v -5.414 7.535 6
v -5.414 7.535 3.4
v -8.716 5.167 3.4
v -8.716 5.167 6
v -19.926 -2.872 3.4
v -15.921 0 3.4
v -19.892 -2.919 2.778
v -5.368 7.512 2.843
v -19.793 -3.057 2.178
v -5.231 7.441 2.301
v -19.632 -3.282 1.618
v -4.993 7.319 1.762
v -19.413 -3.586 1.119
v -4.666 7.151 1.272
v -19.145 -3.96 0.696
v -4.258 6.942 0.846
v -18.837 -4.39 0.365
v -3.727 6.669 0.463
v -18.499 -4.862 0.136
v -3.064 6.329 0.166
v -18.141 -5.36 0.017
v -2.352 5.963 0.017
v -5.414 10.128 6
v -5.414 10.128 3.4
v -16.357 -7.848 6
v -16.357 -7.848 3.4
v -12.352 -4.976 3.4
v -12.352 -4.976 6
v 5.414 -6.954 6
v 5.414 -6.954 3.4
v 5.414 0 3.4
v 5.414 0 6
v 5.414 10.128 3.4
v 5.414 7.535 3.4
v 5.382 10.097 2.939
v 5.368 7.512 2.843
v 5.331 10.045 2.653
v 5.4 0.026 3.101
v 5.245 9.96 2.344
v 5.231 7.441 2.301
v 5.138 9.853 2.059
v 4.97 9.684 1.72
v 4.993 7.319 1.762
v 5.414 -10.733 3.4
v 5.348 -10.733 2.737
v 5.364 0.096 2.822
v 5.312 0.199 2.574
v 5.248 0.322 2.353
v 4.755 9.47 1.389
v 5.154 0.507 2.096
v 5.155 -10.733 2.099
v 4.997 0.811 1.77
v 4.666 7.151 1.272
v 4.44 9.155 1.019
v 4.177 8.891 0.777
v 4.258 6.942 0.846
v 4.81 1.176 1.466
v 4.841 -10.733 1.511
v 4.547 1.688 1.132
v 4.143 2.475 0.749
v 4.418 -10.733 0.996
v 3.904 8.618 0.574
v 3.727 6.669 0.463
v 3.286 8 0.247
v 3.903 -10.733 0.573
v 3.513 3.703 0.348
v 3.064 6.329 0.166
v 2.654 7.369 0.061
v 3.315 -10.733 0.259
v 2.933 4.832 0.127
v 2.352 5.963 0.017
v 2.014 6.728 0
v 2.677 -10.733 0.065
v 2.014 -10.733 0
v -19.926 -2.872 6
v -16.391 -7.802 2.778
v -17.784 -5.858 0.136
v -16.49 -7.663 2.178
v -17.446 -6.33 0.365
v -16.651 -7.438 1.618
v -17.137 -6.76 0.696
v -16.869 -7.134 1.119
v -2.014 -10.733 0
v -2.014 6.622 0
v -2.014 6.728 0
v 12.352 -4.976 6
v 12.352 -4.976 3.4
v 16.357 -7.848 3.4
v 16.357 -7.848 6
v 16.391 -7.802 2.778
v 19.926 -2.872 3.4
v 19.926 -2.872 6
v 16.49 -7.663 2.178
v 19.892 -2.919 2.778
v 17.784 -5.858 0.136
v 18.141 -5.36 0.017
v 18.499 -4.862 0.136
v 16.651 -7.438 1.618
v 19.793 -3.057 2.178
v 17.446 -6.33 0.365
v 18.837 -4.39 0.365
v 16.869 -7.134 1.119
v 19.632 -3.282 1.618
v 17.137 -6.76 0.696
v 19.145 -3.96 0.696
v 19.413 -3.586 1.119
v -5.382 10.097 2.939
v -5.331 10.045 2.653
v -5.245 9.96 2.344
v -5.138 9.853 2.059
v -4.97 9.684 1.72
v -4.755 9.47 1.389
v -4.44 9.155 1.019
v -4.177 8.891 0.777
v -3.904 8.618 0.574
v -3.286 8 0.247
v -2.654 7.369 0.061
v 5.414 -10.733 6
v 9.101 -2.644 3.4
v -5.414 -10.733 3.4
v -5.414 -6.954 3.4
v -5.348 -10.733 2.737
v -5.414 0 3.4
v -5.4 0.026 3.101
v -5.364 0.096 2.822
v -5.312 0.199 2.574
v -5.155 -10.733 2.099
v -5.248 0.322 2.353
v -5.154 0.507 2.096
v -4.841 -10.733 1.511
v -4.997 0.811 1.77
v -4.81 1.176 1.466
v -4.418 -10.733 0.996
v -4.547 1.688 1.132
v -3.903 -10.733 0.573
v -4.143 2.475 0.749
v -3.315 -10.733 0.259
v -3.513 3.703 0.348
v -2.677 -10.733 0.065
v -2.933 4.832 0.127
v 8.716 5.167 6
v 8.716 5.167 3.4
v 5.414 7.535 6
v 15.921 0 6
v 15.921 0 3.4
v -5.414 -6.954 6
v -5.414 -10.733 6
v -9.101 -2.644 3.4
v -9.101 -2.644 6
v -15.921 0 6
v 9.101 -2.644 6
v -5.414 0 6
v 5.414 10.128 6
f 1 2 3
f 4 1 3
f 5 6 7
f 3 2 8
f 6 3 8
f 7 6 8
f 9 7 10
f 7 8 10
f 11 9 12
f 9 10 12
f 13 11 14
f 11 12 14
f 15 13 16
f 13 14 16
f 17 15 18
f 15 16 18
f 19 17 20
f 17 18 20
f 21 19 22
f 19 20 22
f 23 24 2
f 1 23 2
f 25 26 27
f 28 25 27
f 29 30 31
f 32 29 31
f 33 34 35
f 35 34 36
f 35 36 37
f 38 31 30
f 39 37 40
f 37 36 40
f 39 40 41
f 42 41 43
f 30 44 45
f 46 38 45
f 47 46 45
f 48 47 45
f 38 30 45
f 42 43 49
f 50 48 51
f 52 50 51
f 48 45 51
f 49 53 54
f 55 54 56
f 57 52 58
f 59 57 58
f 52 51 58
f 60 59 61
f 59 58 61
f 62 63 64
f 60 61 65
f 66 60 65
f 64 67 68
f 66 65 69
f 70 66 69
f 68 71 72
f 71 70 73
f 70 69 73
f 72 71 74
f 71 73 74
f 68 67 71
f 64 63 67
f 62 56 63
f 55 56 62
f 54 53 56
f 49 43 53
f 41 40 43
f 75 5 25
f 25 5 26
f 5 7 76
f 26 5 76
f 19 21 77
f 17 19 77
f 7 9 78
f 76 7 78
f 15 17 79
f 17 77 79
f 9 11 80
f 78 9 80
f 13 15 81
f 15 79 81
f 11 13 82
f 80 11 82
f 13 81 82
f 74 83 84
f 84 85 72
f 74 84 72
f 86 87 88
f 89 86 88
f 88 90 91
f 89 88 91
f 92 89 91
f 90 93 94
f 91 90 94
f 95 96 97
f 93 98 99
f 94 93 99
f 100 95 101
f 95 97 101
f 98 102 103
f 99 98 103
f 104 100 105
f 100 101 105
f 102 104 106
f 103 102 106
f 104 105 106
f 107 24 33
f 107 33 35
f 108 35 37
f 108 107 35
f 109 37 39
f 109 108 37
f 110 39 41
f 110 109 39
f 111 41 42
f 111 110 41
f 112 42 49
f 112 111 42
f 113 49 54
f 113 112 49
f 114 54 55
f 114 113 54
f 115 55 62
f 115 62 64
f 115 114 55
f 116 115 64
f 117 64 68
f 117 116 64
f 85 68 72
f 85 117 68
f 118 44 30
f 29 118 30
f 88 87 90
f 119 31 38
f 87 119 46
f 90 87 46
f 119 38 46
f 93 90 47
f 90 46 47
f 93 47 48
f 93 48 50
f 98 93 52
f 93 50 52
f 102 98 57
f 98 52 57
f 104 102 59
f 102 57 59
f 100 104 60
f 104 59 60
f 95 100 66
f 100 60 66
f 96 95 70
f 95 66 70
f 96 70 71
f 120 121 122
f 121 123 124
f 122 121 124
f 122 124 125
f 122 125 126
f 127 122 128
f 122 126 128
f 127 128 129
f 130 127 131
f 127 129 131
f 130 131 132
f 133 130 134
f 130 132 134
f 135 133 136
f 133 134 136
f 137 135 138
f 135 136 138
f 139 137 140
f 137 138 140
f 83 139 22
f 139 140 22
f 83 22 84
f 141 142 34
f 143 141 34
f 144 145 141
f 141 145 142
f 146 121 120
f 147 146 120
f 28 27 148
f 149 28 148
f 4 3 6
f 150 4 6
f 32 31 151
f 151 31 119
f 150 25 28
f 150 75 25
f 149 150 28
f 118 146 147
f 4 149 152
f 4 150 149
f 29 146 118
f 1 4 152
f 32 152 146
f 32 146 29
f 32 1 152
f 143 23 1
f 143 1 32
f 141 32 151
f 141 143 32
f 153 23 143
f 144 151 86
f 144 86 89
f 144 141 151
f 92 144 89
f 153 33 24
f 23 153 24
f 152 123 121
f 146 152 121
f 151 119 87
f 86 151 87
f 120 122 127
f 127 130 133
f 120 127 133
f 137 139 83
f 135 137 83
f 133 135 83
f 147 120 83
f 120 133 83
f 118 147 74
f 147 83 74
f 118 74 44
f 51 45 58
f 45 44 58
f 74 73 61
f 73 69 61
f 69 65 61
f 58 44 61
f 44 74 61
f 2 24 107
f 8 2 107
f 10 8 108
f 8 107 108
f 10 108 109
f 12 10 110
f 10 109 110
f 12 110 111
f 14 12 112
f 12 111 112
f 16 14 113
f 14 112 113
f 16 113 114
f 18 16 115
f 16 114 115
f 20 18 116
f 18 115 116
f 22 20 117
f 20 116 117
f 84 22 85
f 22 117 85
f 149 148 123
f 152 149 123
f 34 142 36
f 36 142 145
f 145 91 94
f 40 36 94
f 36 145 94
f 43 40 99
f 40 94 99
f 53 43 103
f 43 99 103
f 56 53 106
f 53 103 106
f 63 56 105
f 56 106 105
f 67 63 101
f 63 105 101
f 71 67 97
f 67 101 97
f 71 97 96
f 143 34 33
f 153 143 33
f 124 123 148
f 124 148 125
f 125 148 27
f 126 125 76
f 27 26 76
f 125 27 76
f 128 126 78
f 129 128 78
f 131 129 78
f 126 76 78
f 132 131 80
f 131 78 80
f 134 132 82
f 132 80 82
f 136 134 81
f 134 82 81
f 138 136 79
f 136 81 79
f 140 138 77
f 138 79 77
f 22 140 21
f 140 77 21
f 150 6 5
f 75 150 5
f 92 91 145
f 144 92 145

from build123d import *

# Parameters (mm, degrees)
F0_W          = 10.8273038641
F0_H          = 3.767536847
F0_H_2        = 3.7791659124
F0_H_3        = 3.1744926237
F1_DEPTH      = 6
F2_T1_DEPTH   = 27.8273038641
F2_T6_DEPTH   = 34.8580118286
F2_T11_DEPTH  = 30.4667466587
F2_T16_DEPTH  = 27.7328249142
F2_T21_DEPTH  = 27.7328249142
F2_T26_DEPTH  = 27.7328249142
F2_T31_DEPTH  = 27.7328249142
F2_T36_DEPTH  = 30.4667466587
F2_T41_DEPTH  = 34.8580118286
F2_T46_DEPTH  = 19.5930984205
F2_T51_DEPTH  = 19.5930984205
F2_T56_DEPTH  = 19.5930984205
F2_T61_DEPTH  = 19.5930984205
F2_T67_DEPTH  = 34.8580118286
F2_T71_DEPTH  = 19.5930984205
F2_T79_DEPTH  = 27.7328249142
F2_T84_DEPTH  = 30.4667466587
F2_T91_DEPTH  = 30.4667466587
F2_T95_DEPTH  = 27.7328249142
F2_T103_DEPTH = 19.5930984205
F2_T108_DEPTH = 34.8580118286


# Not quite as in the source:
# - a fillet or chamfer that OpenCascade refuses, or shapes differently, is made with other operations: its cross-section is extruded or revolved along the edge and cut away or added


with BuildPart() as f1:
    # F0 (on Top) → F1 (new body)
    with BuildSketch(Plane.XY):
        Polygon((-16.3571660357, -7.848105799), (-12.3521852931, -4.9759467929), (-15.9206694666, 0), (-19.9256502092, -2.8721590061), align=None)
        Polygon((-12.3521852931, -4.9759467929), (-9.1011668972, -2.644489449), (-12.6696510706, 2.331457344), (-15.9206694666, 0), align=None)
        Polygon((-9.1011668972, -2.644489449), (-5.413651932, 0), (-8.7160122578, 5.1667966509), (-12.6696510706, 2.331457344), align=None)
        Polygon((-8.7160122578, 5.1667966509), (-5.413651932, 0), (-5.413651932, 3.767536847), (-5.413651932, 7.535073694), align=None)
        Polygon((-5.413651932, 7.535073694), (-5.413651932, 3.767536847), (5.413651932, 3.767536847), (5.413651932, 7.535073694), (0, 7.535073694), align=None)
        Polygon((-5.413651932, 10.1281721145), (-5.413651932, 7.535073694), (0, 7.535073694), (5.413651932, 7.535073694), (5.413651932, 10.1281721145), (0, 10.1281721145), align=None)
        Polygon((5.413651932, 3.767536847), (5.413651932, 0), (8.7160122578, 5.1667966509), (5.413651932, 7.535073694), align=None)
        Polygon((8.7160122578, 5.1667966509), (5.413651932, 0), (9.1011668972, -2.644489449), (12.6696510706, 2.331457344), align=None)
        Polygon((12.6696510706, 2.331457344), (9.1011668972, -2.644489449), (12.3521852931, -4.9759467929), (15.9206694666, 0), align=None)
        Polygon((15.9206694666, 0), (12.3521852931, -4.9759467929), (16.3571660357, -7.848105799), (19.9256502092, -2.8721590061), align=None)
        with Locations((0, 1.8837684235)):
            Rectangle(F0_W, F0_H)
        with Locations((0, -5.0640755799)):
            Rectangle(F0_W, F0_H_2)
        with Locations((0, -1.5872463118)):
            Rectangle(F0_W, F0_H_3)
        Polygon((5.413651932, -6.9536585361), (-5.413651932, -6.9536585361), (-5.413651932, -10.7328249142), (0, -10.7328249142), (5.413651932, -10.7328249142), align=None)
    extrude(amount=F1_DEPTH)

    # F2: fillet of radius 3.4 on 9 edges, made by hand

    # F2_s2 → F2_t1 (cut)
    with BuildSketch(Plane.YZ.offset(-13.913651932)):
        with BuildLine():
            ThreePointArc((10.1281721145, 3.4), (9.1323351705, 0.995836944), (6.7281721145, 0))
            Line((6.7281721145, 0), (10.1281721145, 0))
            Line((10.1281721145, 0), (10.1281721145, 3.4))
        make_face()
    extrude(amount=F2_T1_DEPTH, mode=Mode.SUBTRACT)


with BuildPart() as f2_tool4:
    # F2_s5 → F2_t6 (new body)
    with BuildSketch(Plane(origin=(21.4259097927, -15.365522016, 0), x_dir=(0, 0, 1), z_dir=(-0.8126323589, 0.5827766719, 0))):
        with BuildLine():
            ThreePointArc((3.4, 9.278194766), (0.995836944, 8.2823578221), (0, 5.878194766))
            Line((0, 5.878194766), (0, 9.278194766))
            Line((0, 9.278194766), (3.4, 9.278194766))
        make_face()
    extrude(amount=F2_T6_DEPTH)

    split(bisect_by=Plane.YZ.offset(5.413651932), keep=Keep.TOP)


with BuildPart() as f1_1:
    add(f1.part)

    # F2_t3: cut F2_tool4
    add(f2_tool4.part, mode=Mode.SUBTRACT)


with BuildPart() as f2_tool9:
    # F2_s10 → F2_t11 (new body)
    with BuildSketch(Plane(origin=(-3.3323544119, 2.3897872052, 0), x_dir=(0, 0, 1), z_dir=(0.8126323589, -0.5827766719, 0))):
        with BuildLine():
            ThreePointArc((3.4, -3.1549500557), (0.995836944, -4.1507869997), (0, -6.5549500557))
            Line((0, -6.5549500557), (0, -3.1549500557))
            Line((0, -3.1549500557), (3.4, -3.1549500557))
        make_face()
    extrude(amount=F2_T11_DEPTH)

    split(bisect_by=Plane.YZ.offset(5.413651932), keep=Keep.TOP)


with BuildPart() as f1_2:
    add(f1_1.part)

    # F2_t8: cut F2_tool9
    add(f2_tool9.part, mode=Mode.SUBTRACT)


with BuildPart() as f2_tool14:
    # F2_s15 → F2_t16 (new body)
    with BuildSketch(Plane.XZ.offset(19.2328249142)):
        with BuildLine():
            ThreePointArc((5.413651932, 3.4), (4.4178149881, 0.995836944), (2.013651932, 0))
            Line((2.013651932, 0), (5.413651932, 0))
            Line((5.413651932, 0), (5.413651932, 3.4))
        make_face()
    extrude(amount=-F2_T16_DEPTH)

    split(bisect_by=Plane(origin=(1.8386312935, 2.5638145059, 0), x_dir=(0, 0, 1), z_dir=(-0.5827766719, -0.8126323589, 0)), keep=Keep.TOP)


with BuildPart() as f1_3:
    add(f1_2.part)

    # F2_t13: cut F2_tool14
    add(f2_tool14.part, mode=Mode.SUBTRACT)


with BuildPart() as f2_tool19:
    # F2_s20 → F2_t21 (new body)
    with BuildSketch(Plane.XZ.offset(19.2328249142)):
        with BuildLine():
            ThreePointArc((5.413651932, 3.4), (4.4178149881, 0.995836944), (2.013651932, 0))
            Line((2.013651932, 0), (5.413651932, 0))
            Line((5.413651932, 0), (5.413651932, 3.4))
        make_face()
    extrude(amount=-F2_T21_DEPTH)

    split(bisect_by=Plane(origin=(5.4071154669, 7.5397612989, 0), x_dir=(0, 0, 1), z_dir=(0.5827766719, 0.8126323589, 0)), keep=Keep.TOP)


with BuildPart() as f1_4:
    add(f1_3.part)

    # F2_t18: cut F2_tool19
    add(f2_tool19.part, mode=Mode.SUBTRACT)


with BuildPart() as f2_tool24:
    # F2_s25 → F2_t26 (new body)
    with BuildSketch(Plane.XZ.offset(-8.5)):
        with BuildLine():
            ThreePointArc((-5.413651932, 3.4), (-4.4178149881, 0.995836944), (-2.013651932, 0))
            Line((-2.013651932, 0), (-5.413651932, 0))
            Line((-5.413651932, 0), (-5.413651932, 3.4))
        make_face()
    extrude(amount=F2_T26_DEPTH)

    split(bisect_by=Plane(origin=(-5.4071154669, 7.5397612989, 0), x_dir=(0, 0, 1), z_dir=(-0.5827766719, 0.8126323589, 0)), keep=Keep.TOP)


with BuildPart() as f1_5:
    add(f1_4.part)

    # F2_t23: cut F2_tool24
    add(f2_tool24.part, mode=Mode.SUBTRACT)


with BuildPart() as f2_tool29:
    # F2_s30 → F2_t31 (new body)
    with BuildSketch(Plane.XZ.offset(-8.5)):
        with BuildLine():
            ThreePointArc((-5.413651932, 3.4), (-4.4178149881, 0.995836944), (-2.013651932, 0))
            Line((-2.013651932, 0), (-5.413651932, 0))
            Line((-5.413651932, 0), (-5.413651932, 3.4))
        make_face()
    extrude(amount=F2_T31_DEPTH)

    split(bisect_by=Plane(origin=(-1.8386312935, 2.5638145059, 0), x_dir=(0, 0, 1), z_dir=(0.5827766719, -0.8126323589, 0)), keep=Keep.TOP)


with BuildPart() as f1_6:
    add(f1_5.part)

    # F2_t28: cut F2_tool29
    add(f2_tool29.part, mode=Mode.SUBTRACT)


with BuildPart() as f2_tool34:
    # F2_s35 → F2_t36 (new body)
    with BuildSketch(Plane(origin=(-21.4259097927, -15.365522016, 0), x_dir=(0, 0, 1), z_dir=(0.8126323589, 0.5827766719, 0))):
        with BuildLine():
            ThreePointArc((3.4, -3.1549500557), (0.995836944, -4.1507869997), (0, -6.5549500557))
            Line((0, -6.5549500557), (0, -3.1549500557))
            Line((0, -3.1549500557), (3.4, -3.1549500557))
        make_face()
    extrude(amount=F2_T36_DEPTH)

    split(bisect_by=Plane.YZ.offset(-5.413651932), keep=Keep.BOTTOM)


with BuildPart() as f1_7:
    add(f1_6.part)

    # F2_t33: cut F2_tool34
    add(f2_tool34.part, mode=Mode.SUBTRACT)


with BuildPart() as f2_tool39:
    # F2_s40 → F2_t41 (new body)
    with BuildSketch(Plane(origin=(6.9008385854, 4.9489141062, 0), x_dir=(0, 0, 1), z_dir=(-0.8126323589, -0.5827766719, 0))):
        with BuildLine():
            ThreePointArc((3.4, 9.278194766), (0.995836944, 8.2823578221), (0, 5.878194766))
            Line((0, 5.878194766), (0, 9.278194766))
            Line((0, 9.278194766), (3.4, 9.278194766))
        make_face()
    extrude(amount=F2_T41_DEPTH)

    split(bisect_by=Plane.YZ.offset(-5.413651932), keep=Keep.BOTTOM)


with BuildPart() as f1_8:
    add(f1_7.part)

    # F2_t38: cut F2_tool39
    add(f2_tool39.part, mode=Mode.SUBTRACT)


with BuildPart() as f2_tool44:
    # F2_s45 → F2_t46 (new body)
    with BuildSketch(Plane.XZ.offset(0.964926306)):
        with BuildLine():
            ThreePointArc((5.413651932, 3.4), (4.4178149881, 0.995836944), (2.013651932, 0))
            Line((2.013651932, 0), (5.413651932, 0))
            Line((5.413651932, 0), (5.413651932, 3.4))
        make_face()
    extrude(amount=-F2_T46_DEPTH)

    split(bisect_by=Plane(origin=(1.8386312935, 2.5638145059, 0), x_dir=(0, 0, 1), z_dir=(-0.5827766719, -0.8126323589, 0)), keep=Keep.TOP)


with BuildPart() as f1_9:
    add(f1_8.part)

    # F2_t43: cut F2_tool44
    add(f2_tool44.part, mode=Mode.SUBTRACT)


with BuildPart() as f2_tool49:
    # F2_s50 → F2_t51 (new body)
    with BuildSketch(Plane.XZ.offset(0.964926306)):
        with BuildLine():
            ThreePointArc((5.413651932, 3.4), (4.4178149881, 0.995836944), (2.013651932, 0))
            Line((2.013651932, 0), (5.413651932, 0))
            Line((5.413651932, 0), (5.413651932, 3.4))
        make_face()
    extrude(amount=-F2_T51_DEPTH)

    split(bisect_by=Plane(origin=(5.4071154669, 7.5397612989, 0), x_dir=(0, 0, 1), z_dir=(0.5827766719, 0.8126323589, 0)), keep=Keep.TOP)


with BuildPart() as f1_10:
    add(f1_9.part)

    # F2_t48: cut F2_tool49
    add(f2_tool49.part, mode=Mode.SUBTRACT)


with BuildPart() as f2_tool54:
    # F2_s55 → F2_t56 (new body)
    with BuildSketch(Plane.XZ.offset(-18.6281721145)):
        with BuildLine():
            ThreePointArc((-5.413651932, 3.4), (-4.4178149881, 0.995836944), (-2.013651932, 0))
            Line((-2.013651932, 0), (-5.413651932, 0))
            Line((-5.413651932, 0), (-5.413651932, 3.4))
        make_face()
    extrude(amount=F2_T56_DEPTH)

    split(bisect_by=Plane(origin=(-5.4071154669, 7.5397612989, 0), x_dir=(0, 0, 1), z_dir=(-0.5827766719, 0.8126323589, 0)), keep=Keep.TOP)


with BuildPart() as f1_11:
    add(f1_10.part)

    # F2_t53: cut F2_tool54
    add(f2_tool54.part, mode=Mode.SUBTRACT)


with BuildPart() as f2_tool59:
    # F2_s60 → F2_t61 (new body)
    with BuildSketch(Plane.XZ.offset(-18.6281721145)):
        with BuildLine():
            ThreePointArc((-5.413651932, 3.4), (-4.4178149881, 0.995836944), (-2.013651932, 0))
            Line((-2.013651932, 0), (-5.413651932, 0))
            Line((-5.413651932, 0), (-5.413651932, 3.4))
        make_face()
    extrude(amount=F2_T61_DEPTH)

    split(bisect_by=Plane(origin=(-1.8386312935, 2.5638145059, 0), x_dir=(0, 0, 1), z_dir=(0.5827766719, -0.8126323589, 0)), keep=Keep.TOP)


with BuildPart() as f1_12:
    add(f1_11.part)

    # F2_t58: cut F2_tool59
    add(f2_tool59.part, mode=Mode.SUBTRACT)


with BuildPart() as f2_tool65:
    # F2_s66 → F2_t67 (new body)
    with BuildSketch(Plane(origin=(21.4259097927, -15.365522016, 0), x_dir=(0, 0, 1), z_dir=(-0.8126323589, 0.5827766719, 0))):
        with BuildLine():
            ThreePointArc((3.4, 9.278194766), (0.995836944, 8.2823578221), (0, 5.878194766))
            Line((0, 5.878194766), (0, 9.278194766))
            Line((0, 9.278194766), (3.4, 9.278194766))
        make_face()
    extrude(amount=F2_T67_DEPTH)

    split(bisect_by=Plane.YZ.offset(5.413651932), keep=Keep.BOTTOM)


with BuildPart() as f2_tool69:
    # F2_s70 → F2_t71 (new body)
    with BuildSketch(Plane.XZ.offset(0.964926306)):
        with BuildLine():
            ThreePointArc((5.413651932, 3.4), (4.4178149881, 0.995836944), (2.013651932, 0))
            Line((2.013651932, 0), (5.413651932, 0))
            Line((5.413651932, 0), (5.413651932, 3.4))
        make_face()
    extrude(amount=-F2_T71_DEPTH)

    split(bisect_by=Plane(origin=(1.8386312935, 2.5638145059, 0), x_dir=(0, 0, 1), z_dir=(0.5827766719, 0.8126323589, 0)), keep=Keep.TOP)

    split(bisect_by=Plane(origin=(5.4071154669, 7.5397612989, 0), x_dir=(0, 0, 1), z_dir=(-0.5827766719, -0.8126323589, 0)), keep=Keep.TOP)


with BuildPart() as f2_tool65_1:
    add(f2_tool65.part)

    # F2_t74: intersect F2_tool69
    add(f2_tool69.part, mode=Mode.INTERSECT)


with BuildPart() as f1_13:
    add(f1_12.part)

    # F2_t63: cut F2_tool65
    add(f2_tool65_1.part, mode=Mode.SUBTRACT)


with BuildPart() as f2_tool77:
    # F2_s78 → F2_t79 (new body)
    with BuildSketch(Plane.XZ.offset(19.2328249142)):
        with BuildLine():
            ThreePointArc((5.413651932, 3.4), (4.4178149881, 0.995836944), (2.013651932, 0))
            Line((2.013651932, 0), (5.413651932, 0))
            Line((5.413651932, 0), (5.413651932, 3.4))
        make_face()
    extrude(amount=-F2_T79_DEPTH)

    split(bisect_by=Plane(origin=(1.8386312935, 2.5638145059, 0), x_dir=(0, 0, 1), z_dir=(0.5827766719, 0.8126323589, 0)), keep=Keep.TOP)

    split(bisect_by=Plane(origin=(5.4071154669, 7.5397612989, 0), x_dir=(0, 0, 1), z_dir=(-0.5827766719, -0.8126323589, 0)), keep=Keep.TOP)


with BuildPart() as f2_tool82:
    # F2_s83 → F2_t84 (new body)
    with BuildSketch(Plane(origin=(-3.3323544119, 2.3897872052, 0), x_dir=(0, 0, 1), z_dir=(0.8126323589, -0.5827766719, 0))):
        with BuildLine():
            ThreePointArc((3.4, -3.1549500557), (0.995836944, -4.1507869997), (0, -6.5549500557))
            Line((0, -6.5549500557), (0, -3.1549500557))
            Line((0, -3.1549500557), (3.4, -3.1549500557))
        make_face()
    extrude(amount=F2_T84_DEPTH)

    split(bisect_by=Plane.YZ.offset(5.413651932), keep=Keep.BOTTOM)


with BuildPart() as f2_tool77_1:
    add(f2_tool77.part)

    # F2_t86: intersect F2_tool82
    add(f2_tool82.part, mode=Mode.INTERSECT)


with BuildPart() as f1_14:
    add(f1_13.part)

    # F2_t75: cut F2_tool77
    add(f2_tool77_1.part, mode=Mode.SUBTRACT)


with BuildPart() as f2_tool89:
    # F2_s90 → F2_t91 (new body)
    with BuildSketch(Plane(origin=(-21.4259097927, -15.365522016, 0), x_dir=(0, 0, 1), z_dir=(0.8126323589, 0.5827766719, 0))):
        with BuildLine():
            ThreePointArc((3.4, -3.1549500557), (0.995836944, -4.1507869997), (0, -6.5549500557))
            Line((0, -6.5549500557), (0, -3.1549500557))
            Line((0, -3.1549500557), (3.4, -3.1549500557))
        make_face()
    extrude(amount=F2_T91_DEPTH)

    split(bisect_by=Plane.YZ.offset(-5.413651932), keep=Keep.TOP)


with BuildPart() as f2_tool93:
    # F2_s94 → F2_t95 (new body)
    with BuildSketch(Plane.XZ.offset(-8.5)):
        with BuildLine():
            ThreePointArc((-5.413651932, 3.4), (-4.4178149881, 0.995836944), (-2.013651932, 0))
            Line((-2.013651932, 0), (-5.413651932, 0))
            Line((-5.413651932, 0), (-5.413651932, 3.4))
        make_face()
    extrude(amount=F2_T95_DEPTH)

    split(bisect_by=Plane(origin=(-1.8386312935, 2.5638145059, 0), x_dir=(0, 0, 1), z_dir=(-0.5827766719, 0.8126323589, 0)), keep=Keep.TOP)

    split(bisect_by=Plane(origin=(-5.4071154669, 7.5397612989, 0), x_dir=(0, 0, 1), z_dir=(0.5827766719, -0.8126323589, 0)), keep=Keep.TOP)


with BuildPart() as f2_tool89_1:
    add(f2_tool89.part)

    # F2_t98: intersect F2_tool93
    add(f2_tool93.part, mode=Mode.INTERSECT)


with BuildPart() as f1_15:
    add(f1_14.part)

    # F2_t87: cut F2_tool89
    add(f2_tool89_1.part, mode=Mode.SUBTRACT)


with BuildPart() as f2_tool101:
    # F2_s102 → F2_t103 (new body)
    with BuildSketch(Plane.XZ.offset(-18.6281721145)):
        with BuildLine():
            ThreePointArc((-5.413651932, 3.4), (-4.4178149881, 0.995836944), (-2.013651932, 0))
            Line((-2.013651932, 0), (-5.413651932, 0))
            Line((-5.413651932, 0), (-5.413651932, 3.4))
        make_face()
    extrude(amount=F2_T103_DEPTH)

    split(bisect_by=Plane(origin=(-1.8386312935, 2.5638145059, 0), x_dir=(0, 0, 1), z_dir=(-0.5827766719, 0.8126323589, 0)), keep=Keep.TOP)

    split(bisect_by=Plane(origin=(-5.4071154669, 7.5397612989, 0), x_dir=(0, 0, 1), z_dir=(0.5827766719, -0.8126323589, 0)), keep=Keep.TOP)


with BuildPart() as f2_tool106:
    # F2_s107 → F2_t108 (new body)
    with BuildSketch(Plane(origin=(6.9008385854, 4.9489141062, 0), x_dir=(0, 0, 1), z_dir=(-0.8126323589, -0.5827766719, 0))):
        with BuildLine():
            ThreePointArc((3.4, 9.278194766), (0.995836944, 8.2823578221), (0, 5.878194766))
            Line((0, 5.878194766), (0, 9.278194766))
            Line((0, 9.278194766), (3.4, 9.278194766))
        make_face()
    extrude(amount=F2_T108_DEPTH)

    split(bisect_by=Plane.YZ.offset(-5.413651932), keep=Keep.TOP)


with BuildPart() as f2_tool101_1:
    add(f2_tool101.part)

    # F2_t110: intersect F2_tool106
    add(f2_tool106.part, mode=Mode.INTERSECT)


with BuildPart() as f1_16:
    add(f1_15.part)

    # F2_t99: cut F2_tool101
    add(f2_tool101_1.part, mode=Mode.SUBTRACT)


solid = f1_16.part
